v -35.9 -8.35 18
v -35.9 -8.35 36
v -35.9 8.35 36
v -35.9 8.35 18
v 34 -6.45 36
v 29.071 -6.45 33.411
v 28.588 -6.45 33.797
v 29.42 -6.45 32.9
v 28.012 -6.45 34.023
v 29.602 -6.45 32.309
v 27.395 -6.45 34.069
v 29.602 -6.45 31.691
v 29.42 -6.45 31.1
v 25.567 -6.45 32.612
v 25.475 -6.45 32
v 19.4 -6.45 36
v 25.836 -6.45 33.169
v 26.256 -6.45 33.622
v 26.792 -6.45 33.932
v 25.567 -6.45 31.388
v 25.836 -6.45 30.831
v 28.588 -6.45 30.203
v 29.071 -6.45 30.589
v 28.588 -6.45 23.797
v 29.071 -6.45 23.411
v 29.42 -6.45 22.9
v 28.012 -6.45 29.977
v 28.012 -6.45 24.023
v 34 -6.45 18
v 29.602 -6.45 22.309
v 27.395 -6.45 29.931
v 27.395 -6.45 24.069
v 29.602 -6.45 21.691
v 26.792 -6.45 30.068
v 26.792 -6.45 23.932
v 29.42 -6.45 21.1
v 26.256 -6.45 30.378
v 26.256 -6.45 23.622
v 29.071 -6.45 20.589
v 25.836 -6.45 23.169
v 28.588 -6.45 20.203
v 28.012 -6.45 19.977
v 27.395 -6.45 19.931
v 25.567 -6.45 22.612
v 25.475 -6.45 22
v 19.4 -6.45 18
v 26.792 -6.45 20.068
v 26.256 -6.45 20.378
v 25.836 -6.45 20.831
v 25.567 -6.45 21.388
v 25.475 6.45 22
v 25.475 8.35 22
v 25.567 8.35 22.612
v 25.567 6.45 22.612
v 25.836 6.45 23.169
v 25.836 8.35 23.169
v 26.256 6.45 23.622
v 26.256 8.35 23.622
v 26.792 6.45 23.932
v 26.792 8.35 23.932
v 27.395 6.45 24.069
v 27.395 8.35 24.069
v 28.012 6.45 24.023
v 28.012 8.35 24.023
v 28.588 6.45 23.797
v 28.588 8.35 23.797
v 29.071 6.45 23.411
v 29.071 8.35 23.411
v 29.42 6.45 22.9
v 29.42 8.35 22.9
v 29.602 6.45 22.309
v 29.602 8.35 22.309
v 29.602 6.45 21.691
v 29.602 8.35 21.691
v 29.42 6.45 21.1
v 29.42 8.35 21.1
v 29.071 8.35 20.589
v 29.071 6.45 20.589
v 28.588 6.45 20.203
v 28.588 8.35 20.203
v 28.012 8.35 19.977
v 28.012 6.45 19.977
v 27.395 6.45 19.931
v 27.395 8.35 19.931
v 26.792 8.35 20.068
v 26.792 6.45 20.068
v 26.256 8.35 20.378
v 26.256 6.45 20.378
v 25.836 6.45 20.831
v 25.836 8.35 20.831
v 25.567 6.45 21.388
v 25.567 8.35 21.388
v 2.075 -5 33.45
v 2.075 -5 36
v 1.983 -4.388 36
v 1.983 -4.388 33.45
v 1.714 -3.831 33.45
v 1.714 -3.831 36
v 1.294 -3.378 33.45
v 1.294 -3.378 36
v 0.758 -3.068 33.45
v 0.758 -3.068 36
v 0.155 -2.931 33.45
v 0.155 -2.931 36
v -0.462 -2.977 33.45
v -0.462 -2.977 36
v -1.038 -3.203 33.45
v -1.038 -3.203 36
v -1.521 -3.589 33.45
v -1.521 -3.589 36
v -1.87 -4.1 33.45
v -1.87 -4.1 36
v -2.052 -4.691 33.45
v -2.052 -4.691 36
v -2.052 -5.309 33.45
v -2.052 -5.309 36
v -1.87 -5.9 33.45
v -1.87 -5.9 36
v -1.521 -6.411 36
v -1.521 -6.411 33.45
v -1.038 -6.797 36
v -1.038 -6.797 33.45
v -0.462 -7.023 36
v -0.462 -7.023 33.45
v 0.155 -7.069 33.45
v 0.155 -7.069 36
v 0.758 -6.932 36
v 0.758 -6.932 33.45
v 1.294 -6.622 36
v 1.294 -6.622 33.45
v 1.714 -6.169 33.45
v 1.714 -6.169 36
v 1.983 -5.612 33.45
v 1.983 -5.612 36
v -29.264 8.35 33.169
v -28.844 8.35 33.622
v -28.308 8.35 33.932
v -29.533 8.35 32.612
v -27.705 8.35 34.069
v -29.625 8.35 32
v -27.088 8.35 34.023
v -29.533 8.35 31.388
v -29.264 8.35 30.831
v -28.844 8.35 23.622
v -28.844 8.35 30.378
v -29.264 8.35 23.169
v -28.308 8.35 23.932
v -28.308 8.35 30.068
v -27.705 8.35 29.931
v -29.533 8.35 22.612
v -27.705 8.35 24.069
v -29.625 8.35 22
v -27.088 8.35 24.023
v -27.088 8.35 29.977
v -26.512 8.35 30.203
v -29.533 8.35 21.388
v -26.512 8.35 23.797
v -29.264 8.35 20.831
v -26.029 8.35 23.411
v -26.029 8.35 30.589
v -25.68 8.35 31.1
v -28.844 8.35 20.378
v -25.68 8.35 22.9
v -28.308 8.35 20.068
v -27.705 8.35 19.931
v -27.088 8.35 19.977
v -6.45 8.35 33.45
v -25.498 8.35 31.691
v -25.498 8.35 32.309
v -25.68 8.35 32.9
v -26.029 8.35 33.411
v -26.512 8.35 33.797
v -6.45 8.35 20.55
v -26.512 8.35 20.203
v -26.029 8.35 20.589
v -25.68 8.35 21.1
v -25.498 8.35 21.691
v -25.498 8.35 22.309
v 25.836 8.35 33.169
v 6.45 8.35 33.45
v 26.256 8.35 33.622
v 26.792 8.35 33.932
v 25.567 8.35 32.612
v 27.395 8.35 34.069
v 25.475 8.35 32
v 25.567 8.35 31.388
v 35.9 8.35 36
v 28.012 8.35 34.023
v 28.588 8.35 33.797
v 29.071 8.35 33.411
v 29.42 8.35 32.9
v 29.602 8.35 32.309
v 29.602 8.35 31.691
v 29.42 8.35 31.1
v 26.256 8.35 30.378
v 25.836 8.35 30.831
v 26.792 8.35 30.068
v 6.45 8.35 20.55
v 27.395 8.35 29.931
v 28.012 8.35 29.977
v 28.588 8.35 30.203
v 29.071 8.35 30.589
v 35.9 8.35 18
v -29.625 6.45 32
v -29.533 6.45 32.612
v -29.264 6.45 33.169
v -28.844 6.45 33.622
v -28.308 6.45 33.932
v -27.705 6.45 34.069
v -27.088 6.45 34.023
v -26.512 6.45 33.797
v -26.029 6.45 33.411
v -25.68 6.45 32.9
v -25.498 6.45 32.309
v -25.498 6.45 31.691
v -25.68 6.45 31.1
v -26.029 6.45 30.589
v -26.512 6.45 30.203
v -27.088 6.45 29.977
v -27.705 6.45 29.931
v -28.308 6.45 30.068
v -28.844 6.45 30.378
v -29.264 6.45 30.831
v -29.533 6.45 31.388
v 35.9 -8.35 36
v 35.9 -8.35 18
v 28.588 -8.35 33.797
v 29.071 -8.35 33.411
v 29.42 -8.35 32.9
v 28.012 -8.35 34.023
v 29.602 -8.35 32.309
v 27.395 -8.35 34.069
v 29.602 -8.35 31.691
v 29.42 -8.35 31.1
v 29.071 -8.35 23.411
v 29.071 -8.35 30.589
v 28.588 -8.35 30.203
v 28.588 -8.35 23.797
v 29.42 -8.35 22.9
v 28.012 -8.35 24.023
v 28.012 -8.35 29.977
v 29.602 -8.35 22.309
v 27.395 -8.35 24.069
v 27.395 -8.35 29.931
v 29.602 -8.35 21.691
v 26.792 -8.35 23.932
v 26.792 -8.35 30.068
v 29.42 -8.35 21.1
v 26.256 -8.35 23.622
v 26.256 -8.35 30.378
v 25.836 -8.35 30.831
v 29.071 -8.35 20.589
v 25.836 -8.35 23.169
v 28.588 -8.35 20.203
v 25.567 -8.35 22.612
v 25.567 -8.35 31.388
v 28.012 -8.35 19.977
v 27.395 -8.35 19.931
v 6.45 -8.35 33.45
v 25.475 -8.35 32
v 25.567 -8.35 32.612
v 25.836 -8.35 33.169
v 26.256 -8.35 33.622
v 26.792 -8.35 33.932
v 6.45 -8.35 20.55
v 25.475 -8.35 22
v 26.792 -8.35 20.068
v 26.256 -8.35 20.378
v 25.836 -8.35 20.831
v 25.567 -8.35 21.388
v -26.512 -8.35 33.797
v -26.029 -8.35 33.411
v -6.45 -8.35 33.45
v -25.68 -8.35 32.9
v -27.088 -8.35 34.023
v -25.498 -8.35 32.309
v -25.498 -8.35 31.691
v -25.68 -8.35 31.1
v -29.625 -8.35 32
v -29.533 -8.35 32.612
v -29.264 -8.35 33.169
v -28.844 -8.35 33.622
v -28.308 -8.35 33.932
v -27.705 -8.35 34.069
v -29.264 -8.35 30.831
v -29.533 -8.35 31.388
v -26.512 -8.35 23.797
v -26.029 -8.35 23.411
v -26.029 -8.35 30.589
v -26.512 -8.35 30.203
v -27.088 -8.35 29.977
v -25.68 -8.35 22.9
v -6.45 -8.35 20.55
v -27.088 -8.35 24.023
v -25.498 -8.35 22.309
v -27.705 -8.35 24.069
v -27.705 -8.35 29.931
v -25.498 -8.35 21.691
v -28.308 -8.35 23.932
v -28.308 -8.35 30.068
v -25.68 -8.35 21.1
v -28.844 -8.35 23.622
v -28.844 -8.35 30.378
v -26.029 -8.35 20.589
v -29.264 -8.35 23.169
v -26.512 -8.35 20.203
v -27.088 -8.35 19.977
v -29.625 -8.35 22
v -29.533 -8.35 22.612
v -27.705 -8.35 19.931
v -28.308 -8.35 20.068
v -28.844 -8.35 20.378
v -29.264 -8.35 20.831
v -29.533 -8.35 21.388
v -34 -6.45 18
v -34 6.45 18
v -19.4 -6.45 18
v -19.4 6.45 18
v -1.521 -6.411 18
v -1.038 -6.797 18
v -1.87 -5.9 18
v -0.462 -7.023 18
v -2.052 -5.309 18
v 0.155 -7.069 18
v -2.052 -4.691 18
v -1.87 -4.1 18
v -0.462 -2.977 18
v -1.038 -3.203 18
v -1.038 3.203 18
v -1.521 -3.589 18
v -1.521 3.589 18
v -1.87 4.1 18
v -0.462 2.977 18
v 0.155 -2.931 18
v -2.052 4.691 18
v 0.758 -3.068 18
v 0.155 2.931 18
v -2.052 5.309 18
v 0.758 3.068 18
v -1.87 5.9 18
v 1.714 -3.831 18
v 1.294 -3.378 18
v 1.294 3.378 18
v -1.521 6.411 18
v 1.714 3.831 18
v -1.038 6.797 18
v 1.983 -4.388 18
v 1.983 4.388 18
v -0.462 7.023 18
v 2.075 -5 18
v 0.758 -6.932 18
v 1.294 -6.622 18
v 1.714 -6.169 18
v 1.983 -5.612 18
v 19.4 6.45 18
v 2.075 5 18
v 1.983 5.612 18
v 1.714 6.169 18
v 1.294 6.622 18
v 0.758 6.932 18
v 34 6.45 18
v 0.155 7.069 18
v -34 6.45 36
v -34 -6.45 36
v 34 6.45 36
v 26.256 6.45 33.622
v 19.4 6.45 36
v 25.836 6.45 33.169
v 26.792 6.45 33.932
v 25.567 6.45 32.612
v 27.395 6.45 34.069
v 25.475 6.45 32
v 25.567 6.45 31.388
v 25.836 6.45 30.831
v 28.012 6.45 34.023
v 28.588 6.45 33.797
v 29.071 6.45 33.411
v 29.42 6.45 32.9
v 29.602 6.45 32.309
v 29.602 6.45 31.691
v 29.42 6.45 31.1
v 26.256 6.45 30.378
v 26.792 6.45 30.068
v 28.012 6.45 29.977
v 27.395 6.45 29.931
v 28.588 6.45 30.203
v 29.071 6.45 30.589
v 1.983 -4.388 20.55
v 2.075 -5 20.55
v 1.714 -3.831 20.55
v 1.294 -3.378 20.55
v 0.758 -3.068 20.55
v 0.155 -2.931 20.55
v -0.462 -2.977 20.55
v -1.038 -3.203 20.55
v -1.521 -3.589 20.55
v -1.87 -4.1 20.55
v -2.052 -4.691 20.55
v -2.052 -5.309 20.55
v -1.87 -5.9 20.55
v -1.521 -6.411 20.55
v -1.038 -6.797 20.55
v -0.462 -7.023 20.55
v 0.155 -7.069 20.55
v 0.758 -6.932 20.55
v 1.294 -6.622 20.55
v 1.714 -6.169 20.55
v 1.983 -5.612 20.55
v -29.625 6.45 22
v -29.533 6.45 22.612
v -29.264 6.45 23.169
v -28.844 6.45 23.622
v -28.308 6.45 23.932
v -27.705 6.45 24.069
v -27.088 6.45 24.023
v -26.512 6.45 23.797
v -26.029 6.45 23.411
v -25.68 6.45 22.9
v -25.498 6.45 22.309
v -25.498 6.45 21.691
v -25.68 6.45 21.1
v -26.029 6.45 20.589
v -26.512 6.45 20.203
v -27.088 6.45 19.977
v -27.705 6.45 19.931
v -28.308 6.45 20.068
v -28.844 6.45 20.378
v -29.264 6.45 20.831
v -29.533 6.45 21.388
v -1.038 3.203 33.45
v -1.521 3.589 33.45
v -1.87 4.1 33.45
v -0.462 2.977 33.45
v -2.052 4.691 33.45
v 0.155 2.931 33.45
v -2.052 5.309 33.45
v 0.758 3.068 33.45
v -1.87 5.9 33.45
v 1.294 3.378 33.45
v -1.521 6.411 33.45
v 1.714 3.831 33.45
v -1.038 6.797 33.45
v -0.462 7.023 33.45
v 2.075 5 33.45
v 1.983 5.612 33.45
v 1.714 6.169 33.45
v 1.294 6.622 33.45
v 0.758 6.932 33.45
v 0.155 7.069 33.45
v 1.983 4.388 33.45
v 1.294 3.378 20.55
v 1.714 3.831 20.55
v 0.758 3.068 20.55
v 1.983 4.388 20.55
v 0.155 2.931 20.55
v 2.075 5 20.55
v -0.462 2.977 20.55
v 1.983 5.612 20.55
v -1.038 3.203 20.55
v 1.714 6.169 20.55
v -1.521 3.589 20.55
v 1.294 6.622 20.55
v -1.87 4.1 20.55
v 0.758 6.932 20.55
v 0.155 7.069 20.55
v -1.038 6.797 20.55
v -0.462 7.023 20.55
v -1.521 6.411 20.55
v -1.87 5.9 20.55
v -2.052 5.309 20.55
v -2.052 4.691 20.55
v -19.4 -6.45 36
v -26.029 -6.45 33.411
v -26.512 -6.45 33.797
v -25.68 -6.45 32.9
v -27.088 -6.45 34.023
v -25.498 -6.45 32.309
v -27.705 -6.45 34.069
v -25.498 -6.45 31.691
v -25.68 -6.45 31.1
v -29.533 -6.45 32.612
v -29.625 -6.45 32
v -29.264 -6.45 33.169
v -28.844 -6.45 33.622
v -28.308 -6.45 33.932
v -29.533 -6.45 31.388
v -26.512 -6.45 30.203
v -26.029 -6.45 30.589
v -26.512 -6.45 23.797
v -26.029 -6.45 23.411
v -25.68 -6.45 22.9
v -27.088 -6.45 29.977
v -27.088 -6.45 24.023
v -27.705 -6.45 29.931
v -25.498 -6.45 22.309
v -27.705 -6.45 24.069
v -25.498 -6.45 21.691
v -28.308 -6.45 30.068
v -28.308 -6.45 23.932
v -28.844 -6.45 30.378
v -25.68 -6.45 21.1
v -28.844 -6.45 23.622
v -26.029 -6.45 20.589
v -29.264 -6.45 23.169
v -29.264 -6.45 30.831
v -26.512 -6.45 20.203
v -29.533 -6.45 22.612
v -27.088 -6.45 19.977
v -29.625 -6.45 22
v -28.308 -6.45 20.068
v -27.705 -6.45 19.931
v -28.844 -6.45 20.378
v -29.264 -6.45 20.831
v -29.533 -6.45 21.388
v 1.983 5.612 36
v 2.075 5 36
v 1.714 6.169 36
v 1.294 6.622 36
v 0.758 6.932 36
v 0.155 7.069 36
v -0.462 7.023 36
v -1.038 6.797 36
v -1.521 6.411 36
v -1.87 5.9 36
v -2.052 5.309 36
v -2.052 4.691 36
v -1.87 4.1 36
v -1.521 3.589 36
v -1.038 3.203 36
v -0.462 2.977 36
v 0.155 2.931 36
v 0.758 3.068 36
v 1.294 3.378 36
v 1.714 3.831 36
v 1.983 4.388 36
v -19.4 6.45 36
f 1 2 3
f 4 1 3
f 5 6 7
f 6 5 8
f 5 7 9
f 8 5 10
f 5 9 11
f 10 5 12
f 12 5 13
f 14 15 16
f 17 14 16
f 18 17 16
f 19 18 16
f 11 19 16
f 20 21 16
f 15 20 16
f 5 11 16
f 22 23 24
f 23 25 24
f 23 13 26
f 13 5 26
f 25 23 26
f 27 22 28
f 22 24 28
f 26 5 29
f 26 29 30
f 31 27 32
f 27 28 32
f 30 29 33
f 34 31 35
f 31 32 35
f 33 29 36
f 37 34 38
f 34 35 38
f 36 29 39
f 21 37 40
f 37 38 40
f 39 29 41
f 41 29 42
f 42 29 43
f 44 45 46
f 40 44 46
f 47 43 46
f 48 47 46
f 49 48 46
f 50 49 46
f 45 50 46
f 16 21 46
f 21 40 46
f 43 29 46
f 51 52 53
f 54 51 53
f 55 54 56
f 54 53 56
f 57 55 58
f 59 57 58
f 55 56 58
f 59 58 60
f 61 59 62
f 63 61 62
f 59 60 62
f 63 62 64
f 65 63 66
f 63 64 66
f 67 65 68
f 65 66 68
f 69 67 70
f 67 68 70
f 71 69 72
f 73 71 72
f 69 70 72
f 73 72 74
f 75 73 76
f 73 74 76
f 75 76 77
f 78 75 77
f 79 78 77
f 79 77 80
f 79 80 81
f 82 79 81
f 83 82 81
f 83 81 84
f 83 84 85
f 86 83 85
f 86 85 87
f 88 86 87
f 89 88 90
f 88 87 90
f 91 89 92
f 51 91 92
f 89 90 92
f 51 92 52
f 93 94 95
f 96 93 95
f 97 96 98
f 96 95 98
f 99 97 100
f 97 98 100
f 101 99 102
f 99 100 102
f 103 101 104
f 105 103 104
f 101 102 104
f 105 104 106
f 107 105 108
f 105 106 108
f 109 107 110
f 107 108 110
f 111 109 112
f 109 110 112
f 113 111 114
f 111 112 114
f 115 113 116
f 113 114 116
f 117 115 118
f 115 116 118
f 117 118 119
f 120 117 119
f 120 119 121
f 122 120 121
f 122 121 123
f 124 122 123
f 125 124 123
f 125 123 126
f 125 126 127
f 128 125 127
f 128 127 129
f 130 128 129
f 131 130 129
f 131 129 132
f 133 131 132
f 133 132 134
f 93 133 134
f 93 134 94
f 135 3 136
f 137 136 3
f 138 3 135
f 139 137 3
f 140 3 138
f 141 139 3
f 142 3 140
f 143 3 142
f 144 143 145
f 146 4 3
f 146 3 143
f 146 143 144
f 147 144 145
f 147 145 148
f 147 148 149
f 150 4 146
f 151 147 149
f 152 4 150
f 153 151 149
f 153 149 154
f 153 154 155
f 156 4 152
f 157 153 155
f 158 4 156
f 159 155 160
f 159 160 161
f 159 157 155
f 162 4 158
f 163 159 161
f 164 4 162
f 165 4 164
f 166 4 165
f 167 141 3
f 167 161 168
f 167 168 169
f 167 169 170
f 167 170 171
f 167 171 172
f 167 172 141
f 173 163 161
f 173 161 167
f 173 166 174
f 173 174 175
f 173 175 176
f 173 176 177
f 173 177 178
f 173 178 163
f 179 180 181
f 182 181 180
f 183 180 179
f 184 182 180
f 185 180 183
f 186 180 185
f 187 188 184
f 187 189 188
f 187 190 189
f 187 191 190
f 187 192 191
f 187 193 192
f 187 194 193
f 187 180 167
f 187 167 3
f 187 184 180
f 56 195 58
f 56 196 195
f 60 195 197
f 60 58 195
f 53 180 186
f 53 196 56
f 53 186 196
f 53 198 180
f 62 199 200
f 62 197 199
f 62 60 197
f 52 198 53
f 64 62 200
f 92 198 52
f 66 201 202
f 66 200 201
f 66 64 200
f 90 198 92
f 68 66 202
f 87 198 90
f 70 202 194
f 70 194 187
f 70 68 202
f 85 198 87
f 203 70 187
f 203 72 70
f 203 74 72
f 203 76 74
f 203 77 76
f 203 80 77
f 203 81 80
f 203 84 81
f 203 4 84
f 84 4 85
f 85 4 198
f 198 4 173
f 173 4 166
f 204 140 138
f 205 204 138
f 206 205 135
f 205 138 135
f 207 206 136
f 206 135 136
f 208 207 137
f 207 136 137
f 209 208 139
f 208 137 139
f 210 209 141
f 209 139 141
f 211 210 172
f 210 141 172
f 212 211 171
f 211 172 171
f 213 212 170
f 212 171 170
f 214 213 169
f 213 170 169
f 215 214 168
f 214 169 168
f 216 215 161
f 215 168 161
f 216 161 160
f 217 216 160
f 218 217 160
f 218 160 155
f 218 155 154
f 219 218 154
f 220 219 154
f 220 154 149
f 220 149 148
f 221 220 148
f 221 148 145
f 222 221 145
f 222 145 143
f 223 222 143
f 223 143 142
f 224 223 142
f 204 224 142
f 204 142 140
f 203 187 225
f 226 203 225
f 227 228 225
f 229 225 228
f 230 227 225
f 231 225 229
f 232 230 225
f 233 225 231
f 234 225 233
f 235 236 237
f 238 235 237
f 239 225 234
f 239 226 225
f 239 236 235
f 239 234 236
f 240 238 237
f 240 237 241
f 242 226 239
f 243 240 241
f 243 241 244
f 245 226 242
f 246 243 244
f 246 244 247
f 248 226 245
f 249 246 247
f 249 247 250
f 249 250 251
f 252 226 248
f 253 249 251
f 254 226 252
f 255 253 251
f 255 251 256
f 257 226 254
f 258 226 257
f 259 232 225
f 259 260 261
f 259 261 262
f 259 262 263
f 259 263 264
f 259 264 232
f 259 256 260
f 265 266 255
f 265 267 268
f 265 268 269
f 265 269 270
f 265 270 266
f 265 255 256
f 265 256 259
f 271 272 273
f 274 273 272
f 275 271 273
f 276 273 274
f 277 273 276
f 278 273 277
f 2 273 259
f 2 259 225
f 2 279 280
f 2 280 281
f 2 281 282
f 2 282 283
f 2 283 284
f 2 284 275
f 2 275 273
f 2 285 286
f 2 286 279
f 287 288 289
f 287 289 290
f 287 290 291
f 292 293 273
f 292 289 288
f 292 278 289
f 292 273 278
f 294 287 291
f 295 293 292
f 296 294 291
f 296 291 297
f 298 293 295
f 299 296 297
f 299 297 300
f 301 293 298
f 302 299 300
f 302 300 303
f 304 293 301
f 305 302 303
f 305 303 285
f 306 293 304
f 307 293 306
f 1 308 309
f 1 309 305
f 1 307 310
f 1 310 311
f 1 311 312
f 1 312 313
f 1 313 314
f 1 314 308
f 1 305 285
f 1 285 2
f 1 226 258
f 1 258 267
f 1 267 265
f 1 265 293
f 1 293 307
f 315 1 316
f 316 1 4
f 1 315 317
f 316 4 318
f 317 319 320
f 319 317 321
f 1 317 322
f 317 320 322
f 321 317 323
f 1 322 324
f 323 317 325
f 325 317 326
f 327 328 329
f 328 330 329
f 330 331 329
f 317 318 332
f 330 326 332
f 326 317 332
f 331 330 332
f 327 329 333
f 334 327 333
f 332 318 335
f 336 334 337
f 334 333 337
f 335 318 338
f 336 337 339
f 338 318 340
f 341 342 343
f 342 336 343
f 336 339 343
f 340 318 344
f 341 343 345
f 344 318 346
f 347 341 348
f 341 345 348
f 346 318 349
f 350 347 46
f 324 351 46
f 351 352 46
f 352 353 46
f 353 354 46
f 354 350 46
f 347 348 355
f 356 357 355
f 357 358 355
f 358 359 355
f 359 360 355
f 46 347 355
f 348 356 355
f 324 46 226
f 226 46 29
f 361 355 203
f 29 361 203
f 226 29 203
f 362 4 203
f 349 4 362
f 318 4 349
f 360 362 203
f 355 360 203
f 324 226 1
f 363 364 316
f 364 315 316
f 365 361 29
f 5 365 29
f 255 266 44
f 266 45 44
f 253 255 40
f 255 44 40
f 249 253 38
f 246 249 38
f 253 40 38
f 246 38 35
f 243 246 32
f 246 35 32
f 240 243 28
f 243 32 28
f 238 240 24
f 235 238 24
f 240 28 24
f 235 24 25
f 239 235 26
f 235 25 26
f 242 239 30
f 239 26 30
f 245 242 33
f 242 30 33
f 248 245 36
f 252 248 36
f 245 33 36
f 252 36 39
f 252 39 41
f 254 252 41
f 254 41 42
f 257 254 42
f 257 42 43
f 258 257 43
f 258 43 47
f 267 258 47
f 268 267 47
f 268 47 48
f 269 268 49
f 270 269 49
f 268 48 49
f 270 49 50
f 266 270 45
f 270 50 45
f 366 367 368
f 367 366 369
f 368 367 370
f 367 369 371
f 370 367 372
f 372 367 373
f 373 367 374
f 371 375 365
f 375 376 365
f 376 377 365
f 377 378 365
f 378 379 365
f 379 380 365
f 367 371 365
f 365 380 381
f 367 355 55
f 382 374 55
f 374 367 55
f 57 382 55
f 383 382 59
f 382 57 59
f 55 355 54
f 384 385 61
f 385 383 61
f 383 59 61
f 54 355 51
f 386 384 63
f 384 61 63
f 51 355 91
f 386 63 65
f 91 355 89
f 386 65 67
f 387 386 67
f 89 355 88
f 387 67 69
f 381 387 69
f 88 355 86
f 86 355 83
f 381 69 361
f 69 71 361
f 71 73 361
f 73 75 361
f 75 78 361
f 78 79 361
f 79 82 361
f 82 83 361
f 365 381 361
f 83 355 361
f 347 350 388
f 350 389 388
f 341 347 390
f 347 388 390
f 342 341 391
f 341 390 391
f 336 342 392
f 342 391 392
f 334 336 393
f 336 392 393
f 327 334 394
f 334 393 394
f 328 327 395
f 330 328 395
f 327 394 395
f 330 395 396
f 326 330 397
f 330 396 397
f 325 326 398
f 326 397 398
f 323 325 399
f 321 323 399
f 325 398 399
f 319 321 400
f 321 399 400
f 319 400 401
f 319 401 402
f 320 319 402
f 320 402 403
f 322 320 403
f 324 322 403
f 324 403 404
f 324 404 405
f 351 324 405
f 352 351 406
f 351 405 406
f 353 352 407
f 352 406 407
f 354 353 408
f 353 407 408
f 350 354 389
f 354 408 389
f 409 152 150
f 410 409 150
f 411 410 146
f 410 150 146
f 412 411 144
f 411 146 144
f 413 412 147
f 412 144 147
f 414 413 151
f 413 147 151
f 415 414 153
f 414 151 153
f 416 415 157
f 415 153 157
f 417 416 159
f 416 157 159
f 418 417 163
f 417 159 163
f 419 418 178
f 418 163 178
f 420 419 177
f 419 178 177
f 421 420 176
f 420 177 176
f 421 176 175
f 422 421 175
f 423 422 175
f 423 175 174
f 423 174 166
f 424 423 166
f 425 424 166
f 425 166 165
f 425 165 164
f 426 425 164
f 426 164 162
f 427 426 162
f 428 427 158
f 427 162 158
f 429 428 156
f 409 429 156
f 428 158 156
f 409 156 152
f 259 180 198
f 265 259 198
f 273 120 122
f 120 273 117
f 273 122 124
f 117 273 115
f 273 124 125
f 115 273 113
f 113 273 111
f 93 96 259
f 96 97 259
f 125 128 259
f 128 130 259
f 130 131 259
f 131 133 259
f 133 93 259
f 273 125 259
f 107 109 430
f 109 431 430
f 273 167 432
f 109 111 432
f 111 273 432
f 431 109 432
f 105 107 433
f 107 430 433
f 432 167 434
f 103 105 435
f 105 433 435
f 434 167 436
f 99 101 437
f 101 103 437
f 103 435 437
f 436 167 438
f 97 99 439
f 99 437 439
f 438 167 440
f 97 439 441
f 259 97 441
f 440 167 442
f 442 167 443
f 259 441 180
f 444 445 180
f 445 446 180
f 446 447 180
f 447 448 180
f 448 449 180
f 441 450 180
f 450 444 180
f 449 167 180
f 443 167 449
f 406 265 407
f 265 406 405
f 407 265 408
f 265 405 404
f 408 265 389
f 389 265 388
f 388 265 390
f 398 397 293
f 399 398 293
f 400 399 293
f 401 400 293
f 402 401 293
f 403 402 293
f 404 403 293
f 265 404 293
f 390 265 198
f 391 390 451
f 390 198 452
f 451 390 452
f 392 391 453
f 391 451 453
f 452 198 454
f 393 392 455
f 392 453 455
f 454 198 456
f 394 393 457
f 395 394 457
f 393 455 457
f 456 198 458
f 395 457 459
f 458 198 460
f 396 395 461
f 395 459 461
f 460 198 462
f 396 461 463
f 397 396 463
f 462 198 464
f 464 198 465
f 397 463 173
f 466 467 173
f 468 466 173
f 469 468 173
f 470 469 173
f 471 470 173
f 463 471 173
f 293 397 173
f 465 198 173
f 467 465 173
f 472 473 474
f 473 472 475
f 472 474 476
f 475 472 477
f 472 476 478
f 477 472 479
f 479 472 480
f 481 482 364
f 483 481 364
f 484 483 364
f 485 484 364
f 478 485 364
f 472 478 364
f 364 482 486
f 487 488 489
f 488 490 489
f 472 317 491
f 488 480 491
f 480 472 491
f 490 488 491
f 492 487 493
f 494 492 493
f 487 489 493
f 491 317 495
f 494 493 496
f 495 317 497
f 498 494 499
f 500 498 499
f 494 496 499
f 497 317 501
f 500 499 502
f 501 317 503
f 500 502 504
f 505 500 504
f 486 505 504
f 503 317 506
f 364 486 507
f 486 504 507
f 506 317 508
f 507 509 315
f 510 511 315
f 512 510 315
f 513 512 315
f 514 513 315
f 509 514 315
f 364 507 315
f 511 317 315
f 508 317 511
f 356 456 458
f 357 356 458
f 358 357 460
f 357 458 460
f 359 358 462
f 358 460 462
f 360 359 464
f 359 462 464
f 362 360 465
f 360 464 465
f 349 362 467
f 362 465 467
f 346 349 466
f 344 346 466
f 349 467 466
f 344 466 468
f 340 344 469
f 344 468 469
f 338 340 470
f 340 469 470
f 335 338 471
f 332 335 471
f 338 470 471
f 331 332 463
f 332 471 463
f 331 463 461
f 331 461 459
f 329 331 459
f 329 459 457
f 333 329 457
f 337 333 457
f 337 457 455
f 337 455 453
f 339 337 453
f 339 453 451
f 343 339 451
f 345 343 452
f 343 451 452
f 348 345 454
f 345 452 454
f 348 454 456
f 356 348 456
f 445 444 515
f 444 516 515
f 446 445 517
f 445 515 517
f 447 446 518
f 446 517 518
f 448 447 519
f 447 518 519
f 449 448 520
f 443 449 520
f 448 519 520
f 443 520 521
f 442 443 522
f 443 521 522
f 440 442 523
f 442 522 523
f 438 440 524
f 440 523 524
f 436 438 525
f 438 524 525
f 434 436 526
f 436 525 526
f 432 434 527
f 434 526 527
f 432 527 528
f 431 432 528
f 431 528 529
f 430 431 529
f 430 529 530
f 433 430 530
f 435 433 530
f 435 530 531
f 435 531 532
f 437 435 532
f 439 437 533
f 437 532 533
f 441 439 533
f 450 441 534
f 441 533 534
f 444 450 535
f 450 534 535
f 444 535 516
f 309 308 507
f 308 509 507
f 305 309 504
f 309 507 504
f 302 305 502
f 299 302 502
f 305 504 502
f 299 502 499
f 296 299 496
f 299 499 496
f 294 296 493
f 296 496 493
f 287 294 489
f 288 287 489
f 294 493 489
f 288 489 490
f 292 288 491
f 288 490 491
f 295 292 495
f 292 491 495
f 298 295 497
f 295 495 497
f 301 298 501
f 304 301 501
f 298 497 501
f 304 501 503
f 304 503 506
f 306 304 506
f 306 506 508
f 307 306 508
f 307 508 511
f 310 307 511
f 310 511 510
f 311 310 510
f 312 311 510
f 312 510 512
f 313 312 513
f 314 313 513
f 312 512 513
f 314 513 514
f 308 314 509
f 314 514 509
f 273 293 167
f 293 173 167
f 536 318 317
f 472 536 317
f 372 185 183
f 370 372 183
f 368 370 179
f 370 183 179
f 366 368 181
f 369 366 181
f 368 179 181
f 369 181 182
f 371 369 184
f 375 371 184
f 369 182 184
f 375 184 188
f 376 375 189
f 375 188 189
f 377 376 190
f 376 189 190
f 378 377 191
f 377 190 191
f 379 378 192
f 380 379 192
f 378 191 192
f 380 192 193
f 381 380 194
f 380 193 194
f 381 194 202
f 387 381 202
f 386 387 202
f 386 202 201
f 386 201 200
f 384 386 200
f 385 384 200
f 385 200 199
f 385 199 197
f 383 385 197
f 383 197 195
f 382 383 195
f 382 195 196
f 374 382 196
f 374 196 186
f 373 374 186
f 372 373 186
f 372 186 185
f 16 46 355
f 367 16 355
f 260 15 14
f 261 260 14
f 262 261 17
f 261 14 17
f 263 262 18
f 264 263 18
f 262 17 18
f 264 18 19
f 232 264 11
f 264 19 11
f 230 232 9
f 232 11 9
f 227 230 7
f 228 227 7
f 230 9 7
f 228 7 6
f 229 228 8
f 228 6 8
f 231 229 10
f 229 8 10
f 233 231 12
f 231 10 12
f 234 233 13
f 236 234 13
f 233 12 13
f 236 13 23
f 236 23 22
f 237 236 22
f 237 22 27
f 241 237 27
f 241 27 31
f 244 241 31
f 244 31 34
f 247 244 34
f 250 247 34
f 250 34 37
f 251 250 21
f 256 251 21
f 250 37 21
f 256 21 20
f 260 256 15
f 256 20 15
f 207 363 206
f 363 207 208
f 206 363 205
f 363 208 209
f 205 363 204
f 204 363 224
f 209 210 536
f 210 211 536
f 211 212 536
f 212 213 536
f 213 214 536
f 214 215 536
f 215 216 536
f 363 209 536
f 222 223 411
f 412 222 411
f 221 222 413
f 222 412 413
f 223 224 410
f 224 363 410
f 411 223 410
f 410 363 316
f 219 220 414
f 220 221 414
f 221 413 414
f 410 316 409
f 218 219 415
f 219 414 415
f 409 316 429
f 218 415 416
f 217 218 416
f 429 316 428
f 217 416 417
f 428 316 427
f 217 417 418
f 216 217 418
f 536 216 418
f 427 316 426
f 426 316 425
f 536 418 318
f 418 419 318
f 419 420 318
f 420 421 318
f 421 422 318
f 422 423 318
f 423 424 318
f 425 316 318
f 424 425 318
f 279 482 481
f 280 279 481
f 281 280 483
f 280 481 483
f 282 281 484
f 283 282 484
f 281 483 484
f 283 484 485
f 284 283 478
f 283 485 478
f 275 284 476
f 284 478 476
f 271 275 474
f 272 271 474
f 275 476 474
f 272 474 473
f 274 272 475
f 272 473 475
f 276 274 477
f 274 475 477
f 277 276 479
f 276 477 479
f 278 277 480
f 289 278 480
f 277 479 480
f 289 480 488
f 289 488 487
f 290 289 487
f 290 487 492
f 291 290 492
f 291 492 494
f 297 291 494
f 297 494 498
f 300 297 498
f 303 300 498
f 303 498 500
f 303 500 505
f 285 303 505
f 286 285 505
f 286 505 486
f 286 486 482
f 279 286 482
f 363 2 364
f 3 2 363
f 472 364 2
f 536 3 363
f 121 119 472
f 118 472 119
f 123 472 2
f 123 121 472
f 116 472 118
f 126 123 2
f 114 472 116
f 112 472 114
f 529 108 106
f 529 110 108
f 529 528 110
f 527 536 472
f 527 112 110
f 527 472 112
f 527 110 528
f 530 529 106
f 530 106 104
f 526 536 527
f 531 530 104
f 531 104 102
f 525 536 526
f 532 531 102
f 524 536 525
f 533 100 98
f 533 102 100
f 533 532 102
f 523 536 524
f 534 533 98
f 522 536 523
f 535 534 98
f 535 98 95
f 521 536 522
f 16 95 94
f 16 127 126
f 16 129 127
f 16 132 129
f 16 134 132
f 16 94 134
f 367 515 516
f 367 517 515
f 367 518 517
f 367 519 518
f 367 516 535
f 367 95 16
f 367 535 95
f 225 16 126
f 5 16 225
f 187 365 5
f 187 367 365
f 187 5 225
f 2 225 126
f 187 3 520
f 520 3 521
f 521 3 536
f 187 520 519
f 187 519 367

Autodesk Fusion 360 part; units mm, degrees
sketch "Sketch3" plane through (0, 0, 18) normal (0, 0, 1) x (1, 0, 0)
  line L0 (-33.9, 6.35) -> (-19.5, 6.35) construction
  line L1 (-19.5, 6.35) -> (-19.5, -6.35) construction
  line L2 (-19.5, -6.35) -> (-33.9, -6.35) construction
  line L3 (-33.9, -6.35) -> (-33.9, 6.35) construction
  line L4 (19.5, 6.35) -> (33.9, 6.35) construction
  line L5 (33.9, 6.35) -> (33.9, -6.35) construction
  line L6 (33.9, -6.35) -> (19.5, -6.35) construction
  line L7 (19.5, -6.35) -> (19.5, 6.35) construction
  line L8 (-35.9, 8.35) -> (35.9, 8.35)
  line L9 (35.9, 8.35) -> (35.9, -8.35)
  line L10 (35.9, -8.35) -> (-35.9, -8.35)
  line L11 (-35.9, -8.35) -> (-35.9, 8.35)
  line L12 (-35.9, 8.35) -> (35.9, -8.35) construction
  line L13 (34, 6.45) -> (34, -6.45)
  line L14 (34, -6.45) -> (19.4, -6.45)
  line L15 (19.4, -6.45) -> (19.4, 6.45)
  line L16 (19.4, 6.45) -> (34, 6.45)
  line L17 (-19.4, -6.45) -> (-34, -6.45)
  line L18 (-34, -6.45) -> (-34, 6.45)
  line L19 (-34, 6.45) -> (-19.4, 6.45)
  line L20 (-19.4, 6.45) -> (-19.4, -6.45)
  dimension "d5" = 14.4
  dimension "d6" = 12.7
  dimension "d7" = 14.4
  dimension "d8" = 12.7
  dimension "d9" = 39
  dimension "d12" = 2
  dimension "d13" = 2
  dimension "d15" = 2
  dimension "d16" = 2
extrude "Extrude3" add sketch "Sketch3" along normal blind 18
sketch "Sketch4" plane through (0, 8.35, 0) normal (0, 1, 0) x (-1, 0, 0)
  line L0 (-35.9, 18) -> (35.9, 18)
  line L1 (35.9, 18) -> (35.9, 36)
  line L2 (35.9, 36) -> (-35.9, 36)
  line L3 (-35.9, 36) -> (-35.9, 18)
  circle A0 centre (27.55, 22) radius 2.075
  circle A1 centre (27.55, 32) radius 2.075
  line L4 (35.9, 27) -> (-35.9, 27) construction
  line L5 (34, 18) -> (34, 36)
  line L6 (34, 36) -> (34, 18)
  line L7 (19.4, 18) -> (19.4, 36)
  line L8 (19.4, 36) -> (19.4, 18)
  line L9 (34, 18) -> (19.4, 18) construction
  line L10 (34, 36) -> (19.4, 36) construction
  line L11 (27.55, 18) -> (27.55, 36)
  line L12 (0, 18) -> (0, 36) construction
  circle A2 centre (-27.55, 22) radius 2.075
  circle A3 centre (-27.55, 32) radius 2.075
  line L13 (26.7, 18) -> (26.7, 36) construction
  point P0 (27.55, 18)
  point P1 (27.55, 36)
  dimension "d19" = 4.15
  dimension "d22" = 10
  dimension "d23" = 5
  dimension "d48" = 6.45
extrude "Extrude4" cut sketch "Sketch4" against normal blind 16.7 contours A0 L11 | A0 L11 | A1 L11 | A1 L11 | A2 | A3
sketch "Sketch5" plane through (0, 8.35, 0) normal (0, 1, 0) x (-1, 0, 0)
  circle A0 centre (27.55, 32) radius 2.075
  circle A1 centre (27.55, 22) radius 2.075
  line L0 (-35.9, 18) -> (35.9, 18)
  line L1 (35.9, 18) -> (35.9, 36)
  line L2 (35.9, 36) -> (-35.9, 36)
  line L3 (-35.9, 36) -> (-35.9, 18)
  line L4 (35.9, 27) -> (-35.9, 27) construction
  line L5 (0, 18) -> (0, 36) construction
  line L6 (-6.35, 20.65) -> (6.35, 20.65) construction
  line L7 (6.35, 20.65) -> (6.35, 33.35) construction
  line L8 (6.35, 33.35) -> (-6.35, 33.35) construction
  line L9 (-6.35, 33.35) -> (-6.35, 20.65) construction
  line L10 (-6.35, 20.65) -> (6.35, 33.35) construction
  line L11 (6.35, 20.65) -> (-6.35, 33.35) construction
  circle A2 centre (-27.55, 22) radius 2.075
  circle A3 centre (-27.55, 32) radius 2.075
  line L12 (-6.45, 33.45) -> (-6.45, 20.55)
  line L13 (-6.45, 20.55) -> (6.45, 20.55)
  line L14 (6.45, 20.55) -> (6.45, 33.45)
  line L15 (6.45, 33.45) -> (-6.45, 33.45)
  point P0 (0, 27)
  dimension "d27" = 12.7
  dimension "d28" = 12.7
  dimension "d40" = 0.1
extrude "Extrude5" cut sketch "Sketch5" against normal blind 16.7 contours L12 L13 L14 L15
sketch "Sketch6" plane through (0, 0, 36) normal (0, 0, 1) x (1, 0, 0)
  line L0 (-35.9, -8.35) -> (35.9, -8.35)
  line L1 (35.9, -8.35) -> (35.9, 8.35)
  line L2 (35.9, 8.35) -> (-35.9, 8.35)
  line L3 (-35.9, 8.35) -> (-35.9, -8.35)
  line L4 (6.45, 0) -> (-6.45, 0) construction
  circle A0 centre (0, 5) radius 2.075
  circle A1 centre (0, -5) radius 2.075
  line L5 (-34, 6.45) -> (-19.4, 6.45)
  line L6 (-19.4, 6.45) -> (-19.4, -6.45)
  line L7 (-19.4, -6.45) -> (-34, -6.45)
  line L8 (-34, -6.45) -> (-34, 6.45)
  line L9 (19.4, -6.45) -> (19.4, 6.45)
  line L10 (19.4, 6.45) -> (34, 6.45)
  line L11 (34, 6.45) -> (34, -6.45)
  line L12 (34, -6.45) -> (19.4, -6.45)
  line L13 (-6.45, 8.35) -> (6.45, 8.35)
  line L14 (6.45, 8.35) -> (6.45, -8.35)
  line L15 (6.45, -8.35) -> (-6.45, -8.35)
  line L16 (-6.45, -8.35) -> (-6.45, 8.35)
  line L17 (0, 8.35) -> (0, -8.35) construction
  dimension "d31" = 4.15
  dimension "d32" = 10
  dimension "d33" = 5
extrude "Extrude6" cut sketch "Sketch6" against normal blind 18 contours A0 | A1
equation "d5 = 12.7 mm + addl_wire_space"
equation "d7 = 12.7 mm + addl_wire_space"
equation "d19 = 4 mm + tolerance_hole"
equation "d31 = 4 mm + tolerance_hole"
equation "tolerance_bar = 0.1 mm"
equation "tolerance_hole = 0.15 mm"
equation "d38 = -tolerance_bar"
equation "d39 = -tolerance_bar"
equation "d40 = tolerance_bar"
equation "addl_wire_space = 0.9 mm + 0.8 mm"
equation "d48 = 12.7 mm / 2 + tolerance_bar"
